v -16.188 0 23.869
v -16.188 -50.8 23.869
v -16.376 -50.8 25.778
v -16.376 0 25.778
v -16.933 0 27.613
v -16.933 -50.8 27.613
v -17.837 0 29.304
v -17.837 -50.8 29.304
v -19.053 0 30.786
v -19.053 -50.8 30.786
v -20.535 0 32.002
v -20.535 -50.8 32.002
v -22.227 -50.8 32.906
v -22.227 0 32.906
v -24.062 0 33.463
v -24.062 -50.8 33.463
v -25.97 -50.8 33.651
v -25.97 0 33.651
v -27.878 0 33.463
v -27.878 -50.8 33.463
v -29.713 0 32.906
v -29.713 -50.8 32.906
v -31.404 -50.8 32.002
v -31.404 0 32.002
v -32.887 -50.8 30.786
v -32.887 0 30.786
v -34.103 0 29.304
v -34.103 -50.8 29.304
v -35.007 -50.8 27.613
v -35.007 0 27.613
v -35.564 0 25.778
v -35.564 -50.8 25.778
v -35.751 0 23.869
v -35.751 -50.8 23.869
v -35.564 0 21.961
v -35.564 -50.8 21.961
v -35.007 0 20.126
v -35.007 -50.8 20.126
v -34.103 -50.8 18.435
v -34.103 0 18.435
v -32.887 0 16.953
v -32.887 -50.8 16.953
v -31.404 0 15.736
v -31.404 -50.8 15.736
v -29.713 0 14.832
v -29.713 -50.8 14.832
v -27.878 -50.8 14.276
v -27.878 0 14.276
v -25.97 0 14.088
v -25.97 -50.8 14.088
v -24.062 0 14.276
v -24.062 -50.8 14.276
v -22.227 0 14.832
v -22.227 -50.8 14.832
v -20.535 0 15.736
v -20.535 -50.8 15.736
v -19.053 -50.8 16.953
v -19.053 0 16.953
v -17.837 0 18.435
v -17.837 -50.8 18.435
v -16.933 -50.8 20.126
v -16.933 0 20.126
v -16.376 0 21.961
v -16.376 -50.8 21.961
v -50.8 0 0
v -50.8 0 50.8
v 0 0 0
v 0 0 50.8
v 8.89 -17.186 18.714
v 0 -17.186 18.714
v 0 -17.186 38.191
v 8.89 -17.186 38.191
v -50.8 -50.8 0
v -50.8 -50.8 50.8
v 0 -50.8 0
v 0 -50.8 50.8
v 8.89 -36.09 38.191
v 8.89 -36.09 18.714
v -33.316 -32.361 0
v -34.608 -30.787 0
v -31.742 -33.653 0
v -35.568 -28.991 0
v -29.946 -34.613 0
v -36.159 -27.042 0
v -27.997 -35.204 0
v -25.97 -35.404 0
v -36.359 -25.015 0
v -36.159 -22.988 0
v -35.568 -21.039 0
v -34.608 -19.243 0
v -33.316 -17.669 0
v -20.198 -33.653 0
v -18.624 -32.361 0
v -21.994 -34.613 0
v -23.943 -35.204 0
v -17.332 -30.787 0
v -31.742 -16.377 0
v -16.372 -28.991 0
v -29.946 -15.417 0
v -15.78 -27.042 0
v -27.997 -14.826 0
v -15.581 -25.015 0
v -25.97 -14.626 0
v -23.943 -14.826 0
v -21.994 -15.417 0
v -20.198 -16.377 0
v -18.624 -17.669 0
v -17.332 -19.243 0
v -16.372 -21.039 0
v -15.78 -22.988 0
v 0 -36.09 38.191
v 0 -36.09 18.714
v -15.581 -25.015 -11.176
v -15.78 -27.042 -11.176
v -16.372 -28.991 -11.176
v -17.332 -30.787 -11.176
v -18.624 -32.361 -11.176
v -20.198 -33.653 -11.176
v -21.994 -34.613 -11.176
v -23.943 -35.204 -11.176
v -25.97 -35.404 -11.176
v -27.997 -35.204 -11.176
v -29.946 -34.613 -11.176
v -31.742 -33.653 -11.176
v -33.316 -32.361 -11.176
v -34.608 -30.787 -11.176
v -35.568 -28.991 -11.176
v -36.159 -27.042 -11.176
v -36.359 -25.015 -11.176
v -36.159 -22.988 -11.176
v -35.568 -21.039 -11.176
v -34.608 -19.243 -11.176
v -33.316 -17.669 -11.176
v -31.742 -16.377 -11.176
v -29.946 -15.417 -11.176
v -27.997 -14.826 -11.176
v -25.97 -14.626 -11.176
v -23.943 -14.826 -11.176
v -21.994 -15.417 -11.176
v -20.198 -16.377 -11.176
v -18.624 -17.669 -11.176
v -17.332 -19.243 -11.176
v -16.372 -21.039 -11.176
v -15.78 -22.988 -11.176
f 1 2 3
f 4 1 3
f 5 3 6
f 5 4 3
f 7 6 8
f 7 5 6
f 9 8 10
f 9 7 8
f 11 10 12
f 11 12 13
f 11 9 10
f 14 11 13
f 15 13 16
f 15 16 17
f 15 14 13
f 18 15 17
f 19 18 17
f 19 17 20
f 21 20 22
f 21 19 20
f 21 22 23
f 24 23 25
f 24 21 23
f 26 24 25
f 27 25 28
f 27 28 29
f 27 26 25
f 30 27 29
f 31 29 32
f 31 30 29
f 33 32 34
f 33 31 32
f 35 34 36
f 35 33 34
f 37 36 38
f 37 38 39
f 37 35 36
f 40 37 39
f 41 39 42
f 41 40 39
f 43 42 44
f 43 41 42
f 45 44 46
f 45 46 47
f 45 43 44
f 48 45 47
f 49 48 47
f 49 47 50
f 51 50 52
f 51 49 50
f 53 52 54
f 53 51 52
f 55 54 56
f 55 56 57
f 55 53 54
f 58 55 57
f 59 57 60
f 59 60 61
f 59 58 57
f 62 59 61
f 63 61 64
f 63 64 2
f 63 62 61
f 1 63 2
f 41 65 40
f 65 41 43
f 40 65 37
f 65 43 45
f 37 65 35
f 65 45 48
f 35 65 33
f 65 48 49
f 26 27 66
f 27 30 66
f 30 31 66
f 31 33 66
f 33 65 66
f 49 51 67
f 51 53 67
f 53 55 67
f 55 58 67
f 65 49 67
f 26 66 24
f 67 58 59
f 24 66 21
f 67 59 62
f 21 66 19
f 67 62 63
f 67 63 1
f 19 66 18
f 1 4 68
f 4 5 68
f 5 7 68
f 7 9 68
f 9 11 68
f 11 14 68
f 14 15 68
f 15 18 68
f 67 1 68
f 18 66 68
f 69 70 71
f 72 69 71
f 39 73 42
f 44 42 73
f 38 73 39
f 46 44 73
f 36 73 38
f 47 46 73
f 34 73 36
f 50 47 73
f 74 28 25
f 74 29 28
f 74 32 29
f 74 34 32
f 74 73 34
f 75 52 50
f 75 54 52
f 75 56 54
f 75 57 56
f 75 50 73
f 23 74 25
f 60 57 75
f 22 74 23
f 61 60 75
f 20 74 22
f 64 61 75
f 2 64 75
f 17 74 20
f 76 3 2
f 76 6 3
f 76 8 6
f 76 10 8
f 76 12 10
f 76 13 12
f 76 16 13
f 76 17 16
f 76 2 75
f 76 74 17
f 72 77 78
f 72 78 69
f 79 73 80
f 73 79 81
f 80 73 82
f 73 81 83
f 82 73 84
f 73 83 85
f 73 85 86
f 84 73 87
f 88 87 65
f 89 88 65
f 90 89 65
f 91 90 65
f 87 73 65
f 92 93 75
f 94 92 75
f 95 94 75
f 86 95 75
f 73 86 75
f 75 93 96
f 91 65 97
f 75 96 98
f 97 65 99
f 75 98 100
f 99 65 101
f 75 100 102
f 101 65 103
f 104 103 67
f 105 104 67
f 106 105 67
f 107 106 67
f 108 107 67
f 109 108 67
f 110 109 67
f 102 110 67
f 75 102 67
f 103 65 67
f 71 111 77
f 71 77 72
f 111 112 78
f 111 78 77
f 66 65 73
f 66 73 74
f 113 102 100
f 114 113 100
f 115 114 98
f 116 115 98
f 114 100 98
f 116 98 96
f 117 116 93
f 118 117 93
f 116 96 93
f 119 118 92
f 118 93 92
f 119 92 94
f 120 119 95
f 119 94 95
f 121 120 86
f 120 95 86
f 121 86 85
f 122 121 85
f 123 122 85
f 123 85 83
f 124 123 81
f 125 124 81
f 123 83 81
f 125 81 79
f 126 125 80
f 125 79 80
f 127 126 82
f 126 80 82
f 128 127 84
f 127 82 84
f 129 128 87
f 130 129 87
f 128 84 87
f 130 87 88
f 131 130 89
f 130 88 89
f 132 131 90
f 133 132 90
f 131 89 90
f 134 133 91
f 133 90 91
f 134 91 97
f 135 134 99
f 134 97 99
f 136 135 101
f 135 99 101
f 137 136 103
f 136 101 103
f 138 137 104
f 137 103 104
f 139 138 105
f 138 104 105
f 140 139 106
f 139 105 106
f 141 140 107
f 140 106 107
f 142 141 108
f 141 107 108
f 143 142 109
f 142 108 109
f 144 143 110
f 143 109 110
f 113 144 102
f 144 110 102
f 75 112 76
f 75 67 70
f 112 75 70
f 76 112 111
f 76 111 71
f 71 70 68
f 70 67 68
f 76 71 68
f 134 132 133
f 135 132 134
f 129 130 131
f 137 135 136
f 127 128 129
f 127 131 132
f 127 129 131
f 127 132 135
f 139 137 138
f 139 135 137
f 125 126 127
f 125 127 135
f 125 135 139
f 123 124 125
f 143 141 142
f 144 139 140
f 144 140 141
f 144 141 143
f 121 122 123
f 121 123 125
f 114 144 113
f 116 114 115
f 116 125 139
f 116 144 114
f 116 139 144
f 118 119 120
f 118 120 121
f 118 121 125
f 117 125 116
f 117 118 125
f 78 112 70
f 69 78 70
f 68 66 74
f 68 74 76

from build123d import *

# Parameters (mm, degrees)
F0_W     = 50.8
F0_H     = 50.8
F0_R     = 9.781651
F1_DEPTH = 50.8
F2_W     = 18.904511
F2_H     = 19.477375
F3_DEPTH = 8.636
F4_DEPTH = 8.89
F5_R     = 10.389056
F6_DEPTH = 11.176


with BuildPart() as f1:
    # F0 (on Front) → F1 (new body)
    with BuildSketch(Plane.XZ):
        with Locations((-25.4, 25.4)):
            Rectangle(F0_W, F0_H)
        with Locations((-25.969833, 23.869332)):
            Circle(F0_R, mode=Mode.SUBTRACT)
    extrude(amount=F1_DEPTH)

    # F2 (on face) → F3 (join)
    with BuildSketch(Plane.YZ):
        with Locations((-26.638174, 28.452244)):
            Rectangle(F2_W, F2_H)
    extrude(amount=F3_DEPTH)

    # F2 (on face) → F4 (join)
    with BuildSketch(Plane.YZ):
        with Locations((-26.638174, 28.452244)):
            Rectangle(F2_W, F2_H)
    extrude(amount=F4_DEPTH)

    # F5 (on face) → F6 (join)
    with BuildSketch(Plane(origin=(0, 0, 0), x_dir=(1, 0, 0), z_dir=(0, 0, -1))):
        with Locations((-25.969833, 25.01506)):
            Circle(F5_R)
    extrude(amount=F6_DEPTH)


solid = f1.part
